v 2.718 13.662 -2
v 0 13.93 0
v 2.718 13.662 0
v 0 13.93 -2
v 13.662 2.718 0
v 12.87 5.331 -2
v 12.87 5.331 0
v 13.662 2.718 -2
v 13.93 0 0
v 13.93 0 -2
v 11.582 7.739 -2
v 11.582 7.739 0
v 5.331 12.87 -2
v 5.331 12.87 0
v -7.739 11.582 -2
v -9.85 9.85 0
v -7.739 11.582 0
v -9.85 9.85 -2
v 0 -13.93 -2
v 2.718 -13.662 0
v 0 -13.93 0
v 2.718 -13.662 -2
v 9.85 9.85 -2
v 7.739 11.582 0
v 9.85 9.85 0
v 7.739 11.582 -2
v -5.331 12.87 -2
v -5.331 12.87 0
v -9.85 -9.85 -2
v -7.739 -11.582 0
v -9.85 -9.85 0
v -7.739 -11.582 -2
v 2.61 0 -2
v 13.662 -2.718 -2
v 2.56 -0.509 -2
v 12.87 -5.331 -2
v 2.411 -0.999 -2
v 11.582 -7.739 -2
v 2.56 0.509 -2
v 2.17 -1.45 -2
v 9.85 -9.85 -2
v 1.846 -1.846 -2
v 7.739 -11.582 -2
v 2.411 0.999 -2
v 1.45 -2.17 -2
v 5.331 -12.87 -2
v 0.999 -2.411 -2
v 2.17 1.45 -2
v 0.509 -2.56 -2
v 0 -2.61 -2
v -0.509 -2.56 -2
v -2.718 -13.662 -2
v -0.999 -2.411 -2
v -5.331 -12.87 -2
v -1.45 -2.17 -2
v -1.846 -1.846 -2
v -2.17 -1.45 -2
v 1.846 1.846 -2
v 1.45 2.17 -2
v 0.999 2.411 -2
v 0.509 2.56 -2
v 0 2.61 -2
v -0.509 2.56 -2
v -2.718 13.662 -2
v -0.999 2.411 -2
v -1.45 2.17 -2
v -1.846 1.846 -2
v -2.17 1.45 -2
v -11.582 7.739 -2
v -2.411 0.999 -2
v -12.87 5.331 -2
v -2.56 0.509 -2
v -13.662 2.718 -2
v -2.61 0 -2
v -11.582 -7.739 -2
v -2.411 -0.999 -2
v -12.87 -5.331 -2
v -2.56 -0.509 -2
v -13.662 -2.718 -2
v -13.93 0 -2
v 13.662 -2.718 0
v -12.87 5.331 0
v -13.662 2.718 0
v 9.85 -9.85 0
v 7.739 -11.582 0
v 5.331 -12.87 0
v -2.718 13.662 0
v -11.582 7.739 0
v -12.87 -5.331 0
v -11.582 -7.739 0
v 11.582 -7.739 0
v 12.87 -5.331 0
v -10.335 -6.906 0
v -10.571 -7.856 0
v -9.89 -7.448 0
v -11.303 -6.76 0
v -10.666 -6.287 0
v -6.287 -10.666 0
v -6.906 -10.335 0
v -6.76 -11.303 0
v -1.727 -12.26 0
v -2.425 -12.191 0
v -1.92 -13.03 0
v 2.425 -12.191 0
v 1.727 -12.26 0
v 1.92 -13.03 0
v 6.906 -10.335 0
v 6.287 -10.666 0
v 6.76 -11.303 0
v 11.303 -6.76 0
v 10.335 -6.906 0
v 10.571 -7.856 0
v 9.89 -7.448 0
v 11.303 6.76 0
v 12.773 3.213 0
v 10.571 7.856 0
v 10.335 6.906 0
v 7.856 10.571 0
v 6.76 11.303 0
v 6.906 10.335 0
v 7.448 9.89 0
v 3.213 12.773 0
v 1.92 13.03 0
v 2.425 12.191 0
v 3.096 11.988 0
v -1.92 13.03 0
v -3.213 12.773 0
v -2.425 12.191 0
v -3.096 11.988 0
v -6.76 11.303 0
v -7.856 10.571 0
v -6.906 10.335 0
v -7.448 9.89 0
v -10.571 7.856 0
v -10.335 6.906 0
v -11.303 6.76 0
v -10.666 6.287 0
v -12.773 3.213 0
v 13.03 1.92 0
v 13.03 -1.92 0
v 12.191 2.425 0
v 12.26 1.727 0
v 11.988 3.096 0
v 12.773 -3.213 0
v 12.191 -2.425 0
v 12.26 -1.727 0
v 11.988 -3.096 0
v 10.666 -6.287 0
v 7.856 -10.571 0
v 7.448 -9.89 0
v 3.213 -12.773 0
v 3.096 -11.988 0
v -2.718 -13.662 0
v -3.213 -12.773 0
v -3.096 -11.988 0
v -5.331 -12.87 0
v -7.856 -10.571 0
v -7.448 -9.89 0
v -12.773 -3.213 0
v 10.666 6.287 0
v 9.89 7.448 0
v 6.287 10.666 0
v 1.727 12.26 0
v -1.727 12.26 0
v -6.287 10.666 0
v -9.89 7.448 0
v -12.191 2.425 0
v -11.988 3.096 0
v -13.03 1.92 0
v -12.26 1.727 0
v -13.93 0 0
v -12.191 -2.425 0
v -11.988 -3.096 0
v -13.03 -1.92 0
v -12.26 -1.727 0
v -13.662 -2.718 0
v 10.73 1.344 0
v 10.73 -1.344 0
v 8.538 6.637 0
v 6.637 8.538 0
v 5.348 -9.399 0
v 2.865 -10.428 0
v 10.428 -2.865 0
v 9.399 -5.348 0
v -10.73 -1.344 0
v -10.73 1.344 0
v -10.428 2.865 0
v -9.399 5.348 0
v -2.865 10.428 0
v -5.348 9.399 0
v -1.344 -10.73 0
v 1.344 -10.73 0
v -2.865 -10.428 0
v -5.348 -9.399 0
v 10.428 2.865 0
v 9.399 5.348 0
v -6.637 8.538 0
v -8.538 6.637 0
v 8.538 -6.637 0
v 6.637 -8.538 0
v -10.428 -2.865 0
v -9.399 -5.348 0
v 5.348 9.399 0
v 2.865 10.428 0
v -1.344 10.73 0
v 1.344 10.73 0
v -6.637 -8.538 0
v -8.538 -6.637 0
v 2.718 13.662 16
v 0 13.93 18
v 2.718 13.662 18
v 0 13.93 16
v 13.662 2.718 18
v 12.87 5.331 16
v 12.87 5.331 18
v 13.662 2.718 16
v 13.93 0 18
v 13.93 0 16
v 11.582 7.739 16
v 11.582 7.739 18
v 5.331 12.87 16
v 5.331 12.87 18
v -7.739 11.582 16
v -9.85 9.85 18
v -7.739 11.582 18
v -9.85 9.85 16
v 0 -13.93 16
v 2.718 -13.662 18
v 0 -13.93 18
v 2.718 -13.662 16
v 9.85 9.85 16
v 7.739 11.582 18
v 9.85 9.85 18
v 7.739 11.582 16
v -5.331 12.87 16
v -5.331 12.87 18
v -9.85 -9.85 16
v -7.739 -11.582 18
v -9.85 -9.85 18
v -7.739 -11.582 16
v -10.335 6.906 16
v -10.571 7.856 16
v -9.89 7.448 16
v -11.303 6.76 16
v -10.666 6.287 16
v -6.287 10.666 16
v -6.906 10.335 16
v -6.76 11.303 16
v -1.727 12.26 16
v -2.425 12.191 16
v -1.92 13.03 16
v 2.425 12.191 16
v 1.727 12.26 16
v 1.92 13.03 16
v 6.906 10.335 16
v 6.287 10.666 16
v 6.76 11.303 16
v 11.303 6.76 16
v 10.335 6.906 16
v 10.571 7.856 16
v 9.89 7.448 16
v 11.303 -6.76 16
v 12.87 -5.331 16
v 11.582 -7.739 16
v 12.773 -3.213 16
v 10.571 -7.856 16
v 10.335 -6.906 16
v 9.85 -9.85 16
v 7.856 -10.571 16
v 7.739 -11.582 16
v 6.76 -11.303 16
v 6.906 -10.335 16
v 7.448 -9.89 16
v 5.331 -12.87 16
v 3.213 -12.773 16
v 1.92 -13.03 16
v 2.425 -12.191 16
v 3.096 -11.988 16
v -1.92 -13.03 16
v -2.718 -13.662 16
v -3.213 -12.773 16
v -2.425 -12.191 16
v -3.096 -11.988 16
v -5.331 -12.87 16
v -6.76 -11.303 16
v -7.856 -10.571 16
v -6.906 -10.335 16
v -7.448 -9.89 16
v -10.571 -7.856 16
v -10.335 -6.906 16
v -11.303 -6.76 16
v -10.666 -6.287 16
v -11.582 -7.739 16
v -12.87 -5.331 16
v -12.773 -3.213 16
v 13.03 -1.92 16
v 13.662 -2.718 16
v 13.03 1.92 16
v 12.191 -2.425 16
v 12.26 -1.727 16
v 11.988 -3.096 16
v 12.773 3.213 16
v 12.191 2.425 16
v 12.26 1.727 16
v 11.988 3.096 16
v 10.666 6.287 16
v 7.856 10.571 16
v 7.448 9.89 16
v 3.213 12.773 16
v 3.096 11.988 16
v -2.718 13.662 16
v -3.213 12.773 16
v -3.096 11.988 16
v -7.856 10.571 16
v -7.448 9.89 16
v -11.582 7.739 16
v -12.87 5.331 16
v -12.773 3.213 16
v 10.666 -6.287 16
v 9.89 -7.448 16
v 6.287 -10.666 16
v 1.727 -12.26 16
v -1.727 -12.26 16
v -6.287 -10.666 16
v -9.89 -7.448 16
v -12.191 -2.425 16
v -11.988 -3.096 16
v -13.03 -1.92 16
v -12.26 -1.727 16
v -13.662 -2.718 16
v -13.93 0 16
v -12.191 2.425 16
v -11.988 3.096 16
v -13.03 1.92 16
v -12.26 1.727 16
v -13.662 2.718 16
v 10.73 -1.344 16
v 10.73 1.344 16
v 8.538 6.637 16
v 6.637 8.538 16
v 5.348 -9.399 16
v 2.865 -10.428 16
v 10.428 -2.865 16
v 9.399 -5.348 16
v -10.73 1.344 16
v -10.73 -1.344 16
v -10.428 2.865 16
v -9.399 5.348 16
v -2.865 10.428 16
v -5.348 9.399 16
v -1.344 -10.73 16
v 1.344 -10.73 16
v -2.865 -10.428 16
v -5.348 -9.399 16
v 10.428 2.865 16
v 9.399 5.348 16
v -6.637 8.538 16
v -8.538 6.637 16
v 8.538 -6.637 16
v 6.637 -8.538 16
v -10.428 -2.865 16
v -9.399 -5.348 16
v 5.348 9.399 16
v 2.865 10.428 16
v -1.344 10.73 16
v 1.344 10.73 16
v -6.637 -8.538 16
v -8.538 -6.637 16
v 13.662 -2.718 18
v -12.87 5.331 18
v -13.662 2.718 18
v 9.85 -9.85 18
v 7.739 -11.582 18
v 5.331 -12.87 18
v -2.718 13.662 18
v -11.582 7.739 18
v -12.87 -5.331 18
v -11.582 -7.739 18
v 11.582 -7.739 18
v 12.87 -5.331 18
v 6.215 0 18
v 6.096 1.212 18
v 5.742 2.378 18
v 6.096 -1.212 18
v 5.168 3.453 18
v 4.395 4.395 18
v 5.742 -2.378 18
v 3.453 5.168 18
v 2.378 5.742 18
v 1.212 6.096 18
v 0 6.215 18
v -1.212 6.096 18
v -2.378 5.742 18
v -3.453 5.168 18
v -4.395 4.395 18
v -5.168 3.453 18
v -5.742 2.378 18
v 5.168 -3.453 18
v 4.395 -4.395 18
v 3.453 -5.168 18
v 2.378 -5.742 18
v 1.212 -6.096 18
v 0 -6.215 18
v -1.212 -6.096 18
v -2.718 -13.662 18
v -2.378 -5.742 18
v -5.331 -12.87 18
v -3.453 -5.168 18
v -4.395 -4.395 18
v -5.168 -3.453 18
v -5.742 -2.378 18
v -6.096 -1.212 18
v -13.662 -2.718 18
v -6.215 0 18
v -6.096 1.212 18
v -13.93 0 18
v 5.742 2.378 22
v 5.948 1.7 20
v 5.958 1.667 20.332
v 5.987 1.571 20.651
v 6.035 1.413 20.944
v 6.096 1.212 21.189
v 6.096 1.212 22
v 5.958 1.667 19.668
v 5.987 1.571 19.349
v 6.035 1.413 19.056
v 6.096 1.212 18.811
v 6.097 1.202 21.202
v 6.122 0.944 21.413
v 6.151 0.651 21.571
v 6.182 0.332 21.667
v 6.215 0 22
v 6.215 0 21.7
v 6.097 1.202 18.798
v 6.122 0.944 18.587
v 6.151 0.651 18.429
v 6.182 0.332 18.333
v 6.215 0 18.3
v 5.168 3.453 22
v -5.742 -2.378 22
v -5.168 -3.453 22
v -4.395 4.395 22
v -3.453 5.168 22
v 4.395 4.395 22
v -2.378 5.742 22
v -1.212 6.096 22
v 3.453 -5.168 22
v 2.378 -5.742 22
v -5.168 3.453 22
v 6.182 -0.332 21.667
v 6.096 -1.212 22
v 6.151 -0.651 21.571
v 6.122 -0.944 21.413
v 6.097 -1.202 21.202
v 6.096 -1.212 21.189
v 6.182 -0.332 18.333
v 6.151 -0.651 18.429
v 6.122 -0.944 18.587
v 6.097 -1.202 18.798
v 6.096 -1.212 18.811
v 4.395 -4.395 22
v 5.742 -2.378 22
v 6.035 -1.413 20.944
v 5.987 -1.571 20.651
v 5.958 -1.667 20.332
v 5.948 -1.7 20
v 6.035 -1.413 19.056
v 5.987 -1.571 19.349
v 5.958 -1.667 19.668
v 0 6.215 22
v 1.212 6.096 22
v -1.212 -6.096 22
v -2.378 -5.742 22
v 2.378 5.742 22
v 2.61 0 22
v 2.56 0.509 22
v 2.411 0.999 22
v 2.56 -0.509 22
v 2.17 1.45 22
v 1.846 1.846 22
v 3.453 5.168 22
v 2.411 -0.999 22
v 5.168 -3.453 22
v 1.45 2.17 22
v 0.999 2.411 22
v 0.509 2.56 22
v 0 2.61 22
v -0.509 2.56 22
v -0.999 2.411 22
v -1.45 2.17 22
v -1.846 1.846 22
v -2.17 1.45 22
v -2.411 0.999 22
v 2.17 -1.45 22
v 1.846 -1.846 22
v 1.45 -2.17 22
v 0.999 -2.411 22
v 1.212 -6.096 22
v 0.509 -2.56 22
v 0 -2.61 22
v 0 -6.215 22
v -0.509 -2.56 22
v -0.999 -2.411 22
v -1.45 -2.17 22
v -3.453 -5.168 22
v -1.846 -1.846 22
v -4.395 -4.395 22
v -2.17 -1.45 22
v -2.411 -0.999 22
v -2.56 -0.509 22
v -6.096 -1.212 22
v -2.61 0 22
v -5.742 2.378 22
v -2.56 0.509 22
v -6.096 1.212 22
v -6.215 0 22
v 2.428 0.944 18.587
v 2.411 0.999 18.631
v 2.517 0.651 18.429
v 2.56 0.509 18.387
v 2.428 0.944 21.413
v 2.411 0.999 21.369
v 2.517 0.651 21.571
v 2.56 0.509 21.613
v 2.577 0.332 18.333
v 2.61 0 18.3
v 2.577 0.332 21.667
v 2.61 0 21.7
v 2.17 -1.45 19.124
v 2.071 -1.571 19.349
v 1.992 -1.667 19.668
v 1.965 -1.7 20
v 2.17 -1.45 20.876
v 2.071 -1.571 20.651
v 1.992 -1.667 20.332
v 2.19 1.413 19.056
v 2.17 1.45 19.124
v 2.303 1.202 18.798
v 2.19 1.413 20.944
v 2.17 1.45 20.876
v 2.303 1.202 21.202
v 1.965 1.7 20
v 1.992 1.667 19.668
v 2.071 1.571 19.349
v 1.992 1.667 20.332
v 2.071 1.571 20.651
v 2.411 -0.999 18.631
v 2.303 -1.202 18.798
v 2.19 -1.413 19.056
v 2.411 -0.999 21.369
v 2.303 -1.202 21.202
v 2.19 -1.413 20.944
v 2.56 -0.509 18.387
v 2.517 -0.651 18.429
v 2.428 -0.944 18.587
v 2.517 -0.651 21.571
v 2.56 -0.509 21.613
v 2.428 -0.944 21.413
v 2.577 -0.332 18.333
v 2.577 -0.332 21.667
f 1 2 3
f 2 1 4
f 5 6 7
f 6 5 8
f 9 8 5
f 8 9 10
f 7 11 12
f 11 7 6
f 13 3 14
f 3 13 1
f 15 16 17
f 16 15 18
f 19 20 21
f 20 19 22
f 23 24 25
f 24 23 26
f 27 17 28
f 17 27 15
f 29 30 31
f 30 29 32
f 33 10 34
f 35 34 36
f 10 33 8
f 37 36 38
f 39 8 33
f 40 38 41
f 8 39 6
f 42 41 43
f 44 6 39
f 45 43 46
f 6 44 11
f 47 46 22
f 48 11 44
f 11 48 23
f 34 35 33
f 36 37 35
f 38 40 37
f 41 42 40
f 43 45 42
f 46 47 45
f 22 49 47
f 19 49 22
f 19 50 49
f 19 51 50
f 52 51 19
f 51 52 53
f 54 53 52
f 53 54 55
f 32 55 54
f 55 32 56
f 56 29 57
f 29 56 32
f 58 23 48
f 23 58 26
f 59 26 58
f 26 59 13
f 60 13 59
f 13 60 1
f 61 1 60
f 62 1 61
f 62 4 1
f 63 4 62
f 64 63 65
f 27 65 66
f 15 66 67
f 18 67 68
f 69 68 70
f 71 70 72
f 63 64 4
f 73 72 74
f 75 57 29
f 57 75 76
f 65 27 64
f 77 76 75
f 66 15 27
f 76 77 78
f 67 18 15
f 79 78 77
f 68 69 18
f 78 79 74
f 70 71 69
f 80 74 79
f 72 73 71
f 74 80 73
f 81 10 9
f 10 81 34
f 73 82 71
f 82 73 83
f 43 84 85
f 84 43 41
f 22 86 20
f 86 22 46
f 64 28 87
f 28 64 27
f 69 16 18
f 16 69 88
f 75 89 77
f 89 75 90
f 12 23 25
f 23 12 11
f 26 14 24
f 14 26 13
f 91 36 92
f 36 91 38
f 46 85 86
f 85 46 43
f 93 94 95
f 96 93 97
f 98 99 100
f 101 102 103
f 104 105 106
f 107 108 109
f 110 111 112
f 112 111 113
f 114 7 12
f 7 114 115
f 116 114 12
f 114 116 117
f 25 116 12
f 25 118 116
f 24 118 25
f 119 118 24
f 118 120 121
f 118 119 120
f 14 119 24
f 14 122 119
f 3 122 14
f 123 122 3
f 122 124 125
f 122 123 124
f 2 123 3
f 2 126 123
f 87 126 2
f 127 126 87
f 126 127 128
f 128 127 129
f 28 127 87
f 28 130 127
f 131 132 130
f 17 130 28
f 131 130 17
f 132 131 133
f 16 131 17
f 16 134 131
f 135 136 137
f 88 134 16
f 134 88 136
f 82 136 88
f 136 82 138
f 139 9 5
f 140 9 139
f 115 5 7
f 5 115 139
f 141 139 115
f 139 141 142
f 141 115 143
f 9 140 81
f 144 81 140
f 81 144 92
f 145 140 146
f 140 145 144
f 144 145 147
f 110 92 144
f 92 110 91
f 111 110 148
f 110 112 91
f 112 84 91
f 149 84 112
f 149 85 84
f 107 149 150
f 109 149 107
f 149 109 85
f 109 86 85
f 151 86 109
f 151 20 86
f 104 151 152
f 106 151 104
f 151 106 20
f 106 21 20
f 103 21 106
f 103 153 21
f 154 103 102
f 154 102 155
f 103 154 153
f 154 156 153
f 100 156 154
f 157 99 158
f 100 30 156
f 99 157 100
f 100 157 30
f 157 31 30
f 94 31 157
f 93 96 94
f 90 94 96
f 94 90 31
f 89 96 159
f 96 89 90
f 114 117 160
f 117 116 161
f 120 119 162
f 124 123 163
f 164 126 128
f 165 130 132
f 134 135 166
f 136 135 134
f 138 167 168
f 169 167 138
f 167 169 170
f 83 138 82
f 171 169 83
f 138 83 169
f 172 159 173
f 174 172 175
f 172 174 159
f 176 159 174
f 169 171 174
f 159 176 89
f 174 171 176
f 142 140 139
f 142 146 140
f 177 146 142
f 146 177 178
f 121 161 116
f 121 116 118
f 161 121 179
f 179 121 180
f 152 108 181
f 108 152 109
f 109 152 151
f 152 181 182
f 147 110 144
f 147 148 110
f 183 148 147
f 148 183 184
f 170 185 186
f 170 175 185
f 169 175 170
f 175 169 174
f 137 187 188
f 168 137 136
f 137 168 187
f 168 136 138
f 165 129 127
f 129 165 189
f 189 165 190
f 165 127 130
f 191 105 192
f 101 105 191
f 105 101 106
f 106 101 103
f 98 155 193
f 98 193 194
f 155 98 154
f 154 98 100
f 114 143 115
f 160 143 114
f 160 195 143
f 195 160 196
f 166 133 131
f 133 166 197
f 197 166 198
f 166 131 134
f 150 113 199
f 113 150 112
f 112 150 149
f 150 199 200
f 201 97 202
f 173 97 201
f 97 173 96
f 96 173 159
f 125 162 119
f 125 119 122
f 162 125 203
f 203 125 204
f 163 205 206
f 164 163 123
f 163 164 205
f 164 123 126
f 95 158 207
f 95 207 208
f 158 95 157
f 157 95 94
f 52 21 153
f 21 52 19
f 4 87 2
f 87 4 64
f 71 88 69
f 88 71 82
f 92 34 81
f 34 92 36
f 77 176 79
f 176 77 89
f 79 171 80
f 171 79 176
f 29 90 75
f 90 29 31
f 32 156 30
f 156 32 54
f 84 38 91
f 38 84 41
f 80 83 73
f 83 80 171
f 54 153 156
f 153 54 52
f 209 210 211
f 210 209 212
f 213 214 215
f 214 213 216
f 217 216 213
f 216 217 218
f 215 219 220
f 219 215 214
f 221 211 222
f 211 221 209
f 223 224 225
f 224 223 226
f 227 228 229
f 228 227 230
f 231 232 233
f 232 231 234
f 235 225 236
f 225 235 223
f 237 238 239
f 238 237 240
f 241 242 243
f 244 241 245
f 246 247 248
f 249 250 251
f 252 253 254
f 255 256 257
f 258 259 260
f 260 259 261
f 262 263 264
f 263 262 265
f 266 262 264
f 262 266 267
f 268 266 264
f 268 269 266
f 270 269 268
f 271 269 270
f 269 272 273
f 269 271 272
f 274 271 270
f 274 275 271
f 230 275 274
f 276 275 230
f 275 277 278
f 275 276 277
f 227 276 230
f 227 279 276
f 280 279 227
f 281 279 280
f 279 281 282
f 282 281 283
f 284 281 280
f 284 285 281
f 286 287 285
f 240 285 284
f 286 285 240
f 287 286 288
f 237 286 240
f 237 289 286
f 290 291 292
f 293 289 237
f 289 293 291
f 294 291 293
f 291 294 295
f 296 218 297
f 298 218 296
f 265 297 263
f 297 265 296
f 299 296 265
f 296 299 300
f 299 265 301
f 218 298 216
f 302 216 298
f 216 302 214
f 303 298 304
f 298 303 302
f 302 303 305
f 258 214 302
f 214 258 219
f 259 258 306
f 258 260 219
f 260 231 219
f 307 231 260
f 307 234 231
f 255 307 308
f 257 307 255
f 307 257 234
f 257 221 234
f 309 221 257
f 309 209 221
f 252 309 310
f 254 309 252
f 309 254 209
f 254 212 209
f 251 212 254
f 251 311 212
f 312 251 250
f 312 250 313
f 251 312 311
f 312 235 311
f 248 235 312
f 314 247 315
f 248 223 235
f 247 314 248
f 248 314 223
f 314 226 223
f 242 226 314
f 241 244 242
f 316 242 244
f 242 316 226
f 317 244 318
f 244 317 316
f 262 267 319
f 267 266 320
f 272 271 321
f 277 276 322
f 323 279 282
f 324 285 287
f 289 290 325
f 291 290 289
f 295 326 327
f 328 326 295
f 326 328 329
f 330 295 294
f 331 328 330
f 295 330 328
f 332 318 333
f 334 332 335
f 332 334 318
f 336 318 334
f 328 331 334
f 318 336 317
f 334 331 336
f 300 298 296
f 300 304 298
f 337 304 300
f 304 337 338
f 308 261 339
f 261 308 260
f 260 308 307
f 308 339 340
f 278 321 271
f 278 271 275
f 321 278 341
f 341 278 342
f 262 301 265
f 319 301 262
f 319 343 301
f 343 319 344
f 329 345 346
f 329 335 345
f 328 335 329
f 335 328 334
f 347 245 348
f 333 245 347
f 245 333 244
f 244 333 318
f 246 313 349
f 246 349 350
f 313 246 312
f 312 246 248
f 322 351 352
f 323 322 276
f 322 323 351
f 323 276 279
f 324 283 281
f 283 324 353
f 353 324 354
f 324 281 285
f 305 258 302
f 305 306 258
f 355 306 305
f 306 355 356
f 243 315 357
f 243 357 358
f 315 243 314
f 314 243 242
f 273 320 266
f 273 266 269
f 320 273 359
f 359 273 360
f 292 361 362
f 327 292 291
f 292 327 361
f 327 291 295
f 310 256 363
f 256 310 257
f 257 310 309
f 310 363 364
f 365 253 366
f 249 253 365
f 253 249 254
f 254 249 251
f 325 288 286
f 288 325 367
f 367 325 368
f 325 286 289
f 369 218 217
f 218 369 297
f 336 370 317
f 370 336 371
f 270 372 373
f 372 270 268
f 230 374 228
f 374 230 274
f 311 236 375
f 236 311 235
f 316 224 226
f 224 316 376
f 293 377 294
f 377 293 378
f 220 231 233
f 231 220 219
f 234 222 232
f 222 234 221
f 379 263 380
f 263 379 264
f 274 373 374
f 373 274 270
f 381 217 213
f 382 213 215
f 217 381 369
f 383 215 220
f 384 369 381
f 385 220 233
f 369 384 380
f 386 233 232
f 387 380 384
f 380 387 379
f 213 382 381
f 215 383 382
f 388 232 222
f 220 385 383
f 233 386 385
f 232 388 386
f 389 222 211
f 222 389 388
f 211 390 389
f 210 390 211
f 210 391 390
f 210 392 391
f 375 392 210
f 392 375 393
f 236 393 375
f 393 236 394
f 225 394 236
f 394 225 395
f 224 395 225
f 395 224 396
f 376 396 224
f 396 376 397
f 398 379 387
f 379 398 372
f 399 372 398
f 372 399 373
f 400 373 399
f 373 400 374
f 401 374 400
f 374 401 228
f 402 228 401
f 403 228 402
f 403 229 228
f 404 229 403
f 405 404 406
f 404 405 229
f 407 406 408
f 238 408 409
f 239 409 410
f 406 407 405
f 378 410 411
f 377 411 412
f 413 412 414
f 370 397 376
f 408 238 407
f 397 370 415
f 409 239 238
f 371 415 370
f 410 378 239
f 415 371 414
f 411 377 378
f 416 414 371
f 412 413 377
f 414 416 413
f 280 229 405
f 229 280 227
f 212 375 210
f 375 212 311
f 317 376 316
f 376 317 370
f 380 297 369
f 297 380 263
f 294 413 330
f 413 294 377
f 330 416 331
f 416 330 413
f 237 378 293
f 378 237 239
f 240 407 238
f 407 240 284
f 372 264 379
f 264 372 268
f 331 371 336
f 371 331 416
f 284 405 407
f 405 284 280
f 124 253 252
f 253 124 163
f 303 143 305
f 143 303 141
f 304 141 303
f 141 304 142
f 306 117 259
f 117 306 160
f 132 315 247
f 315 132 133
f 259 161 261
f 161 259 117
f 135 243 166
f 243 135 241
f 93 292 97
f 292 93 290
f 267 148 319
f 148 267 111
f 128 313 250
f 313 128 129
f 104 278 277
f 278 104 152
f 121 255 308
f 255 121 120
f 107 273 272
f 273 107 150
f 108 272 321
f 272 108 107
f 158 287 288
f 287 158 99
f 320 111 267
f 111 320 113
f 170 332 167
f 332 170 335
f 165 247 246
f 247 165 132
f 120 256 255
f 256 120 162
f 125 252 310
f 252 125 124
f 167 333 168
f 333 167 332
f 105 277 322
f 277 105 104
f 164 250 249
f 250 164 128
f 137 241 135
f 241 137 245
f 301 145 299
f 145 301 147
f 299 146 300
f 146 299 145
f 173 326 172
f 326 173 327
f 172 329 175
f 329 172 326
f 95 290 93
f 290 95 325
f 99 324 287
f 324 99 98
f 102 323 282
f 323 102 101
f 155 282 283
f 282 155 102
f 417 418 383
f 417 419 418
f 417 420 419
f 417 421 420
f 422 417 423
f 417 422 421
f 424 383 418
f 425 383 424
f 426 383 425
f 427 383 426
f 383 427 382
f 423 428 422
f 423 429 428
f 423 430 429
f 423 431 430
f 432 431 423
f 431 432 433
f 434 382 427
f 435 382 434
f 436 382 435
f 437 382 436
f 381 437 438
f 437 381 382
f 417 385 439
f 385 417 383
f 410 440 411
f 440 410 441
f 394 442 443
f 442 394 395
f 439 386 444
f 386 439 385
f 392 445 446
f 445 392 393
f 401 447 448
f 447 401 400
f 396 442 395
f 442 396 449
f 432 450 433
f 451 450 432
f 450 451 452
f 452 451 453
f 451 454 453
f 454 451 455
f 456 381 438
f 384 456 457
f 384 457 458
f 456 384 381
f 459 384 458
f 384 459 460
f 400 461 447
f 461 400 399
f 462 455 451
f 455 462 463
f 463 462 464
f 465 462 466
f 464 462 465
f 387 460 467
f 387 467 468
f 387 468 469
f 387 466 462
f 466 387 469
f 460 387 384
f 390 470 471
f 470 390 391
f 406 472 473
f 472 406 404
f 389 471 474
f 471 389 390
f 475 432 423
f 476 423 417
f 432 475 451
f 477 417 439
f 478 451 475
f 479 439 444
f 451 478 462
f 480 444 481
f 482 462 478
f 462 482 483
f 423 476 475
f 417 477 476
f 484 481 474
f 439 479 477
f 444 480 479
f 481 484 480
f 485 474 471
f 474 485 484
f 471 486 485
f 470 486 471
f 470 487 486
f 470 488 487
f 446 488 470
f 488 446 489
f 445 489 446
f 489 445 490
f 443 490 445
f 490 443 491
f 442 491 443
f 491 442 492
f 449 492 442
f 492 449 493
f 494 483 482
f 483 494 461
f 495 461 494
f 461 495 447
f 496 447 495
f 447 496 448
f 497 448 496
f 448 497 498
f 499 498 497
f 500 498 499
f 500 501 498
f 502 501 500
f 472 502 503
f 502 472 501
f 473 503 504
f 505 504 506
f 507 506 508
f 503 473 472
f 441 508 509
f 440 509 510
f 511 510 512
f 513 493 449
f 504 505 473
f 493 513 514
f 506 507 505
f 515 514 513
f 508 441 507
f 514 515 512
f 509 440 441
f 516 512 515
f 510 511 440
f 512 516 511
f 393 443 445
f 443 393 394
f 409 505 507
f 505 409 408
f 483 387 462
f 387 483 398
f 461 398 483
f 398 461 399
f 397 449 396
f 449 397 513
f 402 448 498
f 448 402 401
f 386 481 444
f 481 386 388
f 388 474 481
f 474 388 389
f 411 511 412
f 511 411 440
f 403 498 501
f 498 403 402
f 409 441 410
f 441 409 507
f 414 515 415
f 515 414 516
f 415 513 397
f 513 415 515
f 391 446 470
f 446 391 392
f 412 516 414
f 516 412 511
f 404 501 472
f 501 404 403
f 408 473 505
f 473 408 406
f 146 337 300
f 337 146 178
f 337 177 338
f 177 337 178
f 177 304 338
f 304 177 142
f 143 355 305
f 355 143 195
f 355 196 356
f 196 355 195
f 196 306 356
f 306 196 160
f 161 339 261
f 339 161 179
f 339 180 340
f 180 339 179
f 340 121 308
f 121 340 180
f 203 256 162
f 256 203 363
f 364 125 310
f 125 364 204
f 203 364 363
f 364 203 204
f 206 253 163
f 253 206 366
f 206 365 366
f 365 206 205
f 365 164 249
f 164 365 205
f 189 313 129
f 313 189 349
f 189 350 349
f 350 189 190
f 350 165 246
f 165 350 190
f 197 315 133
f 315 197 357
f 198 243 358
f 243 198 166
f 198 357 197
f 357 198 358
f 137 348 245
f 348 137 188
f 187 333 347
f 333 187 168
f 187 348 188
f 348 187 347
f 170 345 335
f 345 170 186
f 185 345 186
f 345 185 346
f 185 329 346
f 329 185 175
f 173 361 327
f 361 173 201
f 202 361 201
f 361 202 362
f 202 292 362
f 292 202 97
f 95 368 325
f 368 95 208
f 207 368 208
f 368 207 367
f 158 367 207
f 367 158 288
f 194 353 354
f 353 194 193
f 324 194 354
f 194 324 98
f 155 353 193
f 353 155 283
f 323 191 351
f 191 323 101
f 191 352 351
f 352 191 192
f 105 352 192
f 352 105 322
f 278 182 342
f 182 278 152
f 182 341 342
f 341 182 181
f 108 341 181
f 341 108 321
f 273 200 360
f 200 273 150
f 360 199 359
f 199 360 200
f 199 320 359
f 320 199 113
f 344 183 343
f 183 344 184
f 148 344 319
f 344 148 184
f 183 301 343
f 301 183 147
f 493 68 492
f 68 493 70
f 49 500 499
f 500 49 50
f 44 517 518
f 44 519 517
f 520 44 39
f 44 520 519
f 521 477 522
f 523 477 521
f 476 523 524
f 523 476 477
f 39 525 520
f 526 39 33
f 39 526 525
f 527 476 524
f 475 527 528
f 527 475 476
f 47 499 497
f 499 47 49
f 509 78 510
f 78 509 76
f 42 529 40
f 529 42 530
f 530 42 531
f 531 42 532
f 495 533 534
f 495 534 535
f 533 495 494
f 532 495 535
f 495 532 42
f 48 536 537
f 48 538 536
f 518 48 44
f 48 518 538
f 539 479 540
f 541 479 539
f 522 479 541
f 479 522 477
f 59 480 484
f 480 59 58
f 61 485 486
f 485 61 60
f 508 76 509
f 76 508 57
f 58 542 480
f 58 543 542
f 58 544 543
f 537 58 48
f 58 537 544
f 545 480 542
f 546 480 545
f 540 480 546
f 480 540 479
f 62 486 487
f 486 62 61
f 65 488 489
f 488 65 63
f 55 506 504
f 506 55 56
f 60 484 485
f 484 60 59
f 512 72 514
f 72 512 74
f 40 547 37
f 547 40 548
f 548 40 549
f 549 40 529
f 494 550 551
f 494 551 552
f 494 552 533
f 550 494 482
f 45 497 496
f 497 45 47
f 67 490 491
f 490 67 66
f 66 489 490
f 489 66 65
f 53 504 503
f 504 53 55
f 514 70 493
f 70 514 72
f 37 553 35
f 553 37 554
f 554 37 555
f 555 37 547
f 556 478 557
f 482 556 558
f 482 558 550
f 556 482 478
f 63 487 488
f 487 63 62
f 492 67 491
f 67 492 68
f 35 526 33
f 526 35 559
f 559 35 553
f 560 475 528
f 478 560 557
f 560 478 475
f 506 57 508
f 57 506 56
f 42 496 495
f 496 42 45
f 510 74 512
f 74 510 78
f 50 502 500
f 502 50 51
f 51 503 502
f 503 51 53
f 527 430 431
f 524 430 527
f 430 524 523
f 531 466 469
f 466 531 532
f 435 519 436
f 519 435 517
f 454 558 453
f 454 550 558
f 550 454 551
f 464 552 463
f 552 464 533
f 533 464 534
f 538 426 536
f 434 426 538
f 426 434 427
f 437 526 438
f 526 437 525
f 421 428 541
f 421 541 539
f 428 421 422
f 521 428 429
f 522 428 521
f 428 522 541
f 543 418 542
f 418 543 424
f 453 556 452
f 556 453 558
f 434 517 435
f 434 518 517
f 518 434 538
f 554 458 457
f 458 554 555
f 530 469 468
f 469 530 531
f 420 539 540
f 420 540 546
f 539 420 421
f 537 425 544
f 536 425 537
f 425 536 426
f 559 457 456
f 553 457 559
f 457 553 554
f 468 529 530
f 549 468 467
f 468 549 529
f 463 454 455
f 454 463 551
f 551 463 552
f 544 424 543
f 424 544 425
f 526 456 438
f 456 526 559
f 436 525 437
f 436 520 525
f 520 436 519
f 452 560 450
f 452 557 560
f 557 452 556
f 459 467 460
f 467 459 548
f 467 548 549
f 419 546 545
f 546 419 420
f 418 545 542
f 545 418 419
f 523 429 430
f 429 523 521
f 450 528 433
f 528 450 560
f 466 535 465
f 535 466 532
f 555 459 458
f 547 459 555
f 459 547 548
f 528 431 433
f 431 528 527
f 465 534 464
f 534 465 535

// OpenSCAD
$fn = 32;

// ----------------------------------------------------------------------
// Timing pulley: HTD5 16T, pitch 5 mm, 27.86 mm x 24 mm
// ----------------------------------------------------------------------

// --- parameters (mm) ---
belt_pitch = 5;           // belt pitch
n_teeth = 16;             // number of grooves
rim_w = 16;               // belt width between the flanges
tip_d = 24.86;            // tip circle diameter
root_d = 22.66;           // groove bottom diameter
groove_h = 1.1;           // groove depth
tooth_w = 3.2;            // groove width at the tip circle
rim_d = 27.86;            // flange diameter
rim_t = 2;                // flange thickness
spigot_d = 21.06;         // flange spigot, sunk into the rim
spigot_h = 1.2;           // spigot depth into the rim
shaft_d = 5.22;           // shaft bore
hub_d = 12.43;            // hub diameter
hub_h = 4;                // hub above the flange
bottom_z = -2;            // lowest point of the pulley
top_z = 22;               // highest point of the pulley
set_d = 3.4;              // set screw tap hole

module rim() {
  cylinder(h = rim_w, d = tip_d);
}

module groove_cutter() {
  /* belt tooth groove: deeper than wide, cut through the belt width */
  translate([root_d / 2, 0, 0])
    linear_extrude(height = rim_w)
      polygon(points = [[-0.6, -tooth_w * 0.42], [groove_h + 0.6, -tooth_w * 0.6],
                        [groove_h + 0.6, tooth_w * 0.6], [-0.6, tooth_w * 0.42]]);
}

module flanges() {
  translate([0, 0, -rim_t]) cylinder(h = rim_t, d = rim_d);
  translate([0, 0, rim_w]) cylinder(h = rim_t, d = rim_d);
  translate([0, 0, -spigot_h]) cylinder(h = spigot_h + 0.6, d = spigot_d);
  translate([0, 0, rim_w - 0.6]) cylinder(h = spigot_h + 0.6, d = spigot_d);
}

module hub() {
  translate([0, 0, bottom_z]) cylinder(h = top_z - bottom_z, d = hub_d);
}

difference() {
  union() {
    rim();
    hub();
    flanges();
  }
  for (i = [0 : n_teeth - 1]) rotate([0, 0, i * 360 / n_teeth]) groove_cutter();
  translate([0, 0, bottom_z - 1]) cylinder(h = top_z - bottom_z + 2, d = shaft_d);
  translate([-1, 0, top_z - hub_h * 0.5]) rotate([0, 90, 0]) cylinder(h = hub_d / 2 + 3, d = set_d);
}
